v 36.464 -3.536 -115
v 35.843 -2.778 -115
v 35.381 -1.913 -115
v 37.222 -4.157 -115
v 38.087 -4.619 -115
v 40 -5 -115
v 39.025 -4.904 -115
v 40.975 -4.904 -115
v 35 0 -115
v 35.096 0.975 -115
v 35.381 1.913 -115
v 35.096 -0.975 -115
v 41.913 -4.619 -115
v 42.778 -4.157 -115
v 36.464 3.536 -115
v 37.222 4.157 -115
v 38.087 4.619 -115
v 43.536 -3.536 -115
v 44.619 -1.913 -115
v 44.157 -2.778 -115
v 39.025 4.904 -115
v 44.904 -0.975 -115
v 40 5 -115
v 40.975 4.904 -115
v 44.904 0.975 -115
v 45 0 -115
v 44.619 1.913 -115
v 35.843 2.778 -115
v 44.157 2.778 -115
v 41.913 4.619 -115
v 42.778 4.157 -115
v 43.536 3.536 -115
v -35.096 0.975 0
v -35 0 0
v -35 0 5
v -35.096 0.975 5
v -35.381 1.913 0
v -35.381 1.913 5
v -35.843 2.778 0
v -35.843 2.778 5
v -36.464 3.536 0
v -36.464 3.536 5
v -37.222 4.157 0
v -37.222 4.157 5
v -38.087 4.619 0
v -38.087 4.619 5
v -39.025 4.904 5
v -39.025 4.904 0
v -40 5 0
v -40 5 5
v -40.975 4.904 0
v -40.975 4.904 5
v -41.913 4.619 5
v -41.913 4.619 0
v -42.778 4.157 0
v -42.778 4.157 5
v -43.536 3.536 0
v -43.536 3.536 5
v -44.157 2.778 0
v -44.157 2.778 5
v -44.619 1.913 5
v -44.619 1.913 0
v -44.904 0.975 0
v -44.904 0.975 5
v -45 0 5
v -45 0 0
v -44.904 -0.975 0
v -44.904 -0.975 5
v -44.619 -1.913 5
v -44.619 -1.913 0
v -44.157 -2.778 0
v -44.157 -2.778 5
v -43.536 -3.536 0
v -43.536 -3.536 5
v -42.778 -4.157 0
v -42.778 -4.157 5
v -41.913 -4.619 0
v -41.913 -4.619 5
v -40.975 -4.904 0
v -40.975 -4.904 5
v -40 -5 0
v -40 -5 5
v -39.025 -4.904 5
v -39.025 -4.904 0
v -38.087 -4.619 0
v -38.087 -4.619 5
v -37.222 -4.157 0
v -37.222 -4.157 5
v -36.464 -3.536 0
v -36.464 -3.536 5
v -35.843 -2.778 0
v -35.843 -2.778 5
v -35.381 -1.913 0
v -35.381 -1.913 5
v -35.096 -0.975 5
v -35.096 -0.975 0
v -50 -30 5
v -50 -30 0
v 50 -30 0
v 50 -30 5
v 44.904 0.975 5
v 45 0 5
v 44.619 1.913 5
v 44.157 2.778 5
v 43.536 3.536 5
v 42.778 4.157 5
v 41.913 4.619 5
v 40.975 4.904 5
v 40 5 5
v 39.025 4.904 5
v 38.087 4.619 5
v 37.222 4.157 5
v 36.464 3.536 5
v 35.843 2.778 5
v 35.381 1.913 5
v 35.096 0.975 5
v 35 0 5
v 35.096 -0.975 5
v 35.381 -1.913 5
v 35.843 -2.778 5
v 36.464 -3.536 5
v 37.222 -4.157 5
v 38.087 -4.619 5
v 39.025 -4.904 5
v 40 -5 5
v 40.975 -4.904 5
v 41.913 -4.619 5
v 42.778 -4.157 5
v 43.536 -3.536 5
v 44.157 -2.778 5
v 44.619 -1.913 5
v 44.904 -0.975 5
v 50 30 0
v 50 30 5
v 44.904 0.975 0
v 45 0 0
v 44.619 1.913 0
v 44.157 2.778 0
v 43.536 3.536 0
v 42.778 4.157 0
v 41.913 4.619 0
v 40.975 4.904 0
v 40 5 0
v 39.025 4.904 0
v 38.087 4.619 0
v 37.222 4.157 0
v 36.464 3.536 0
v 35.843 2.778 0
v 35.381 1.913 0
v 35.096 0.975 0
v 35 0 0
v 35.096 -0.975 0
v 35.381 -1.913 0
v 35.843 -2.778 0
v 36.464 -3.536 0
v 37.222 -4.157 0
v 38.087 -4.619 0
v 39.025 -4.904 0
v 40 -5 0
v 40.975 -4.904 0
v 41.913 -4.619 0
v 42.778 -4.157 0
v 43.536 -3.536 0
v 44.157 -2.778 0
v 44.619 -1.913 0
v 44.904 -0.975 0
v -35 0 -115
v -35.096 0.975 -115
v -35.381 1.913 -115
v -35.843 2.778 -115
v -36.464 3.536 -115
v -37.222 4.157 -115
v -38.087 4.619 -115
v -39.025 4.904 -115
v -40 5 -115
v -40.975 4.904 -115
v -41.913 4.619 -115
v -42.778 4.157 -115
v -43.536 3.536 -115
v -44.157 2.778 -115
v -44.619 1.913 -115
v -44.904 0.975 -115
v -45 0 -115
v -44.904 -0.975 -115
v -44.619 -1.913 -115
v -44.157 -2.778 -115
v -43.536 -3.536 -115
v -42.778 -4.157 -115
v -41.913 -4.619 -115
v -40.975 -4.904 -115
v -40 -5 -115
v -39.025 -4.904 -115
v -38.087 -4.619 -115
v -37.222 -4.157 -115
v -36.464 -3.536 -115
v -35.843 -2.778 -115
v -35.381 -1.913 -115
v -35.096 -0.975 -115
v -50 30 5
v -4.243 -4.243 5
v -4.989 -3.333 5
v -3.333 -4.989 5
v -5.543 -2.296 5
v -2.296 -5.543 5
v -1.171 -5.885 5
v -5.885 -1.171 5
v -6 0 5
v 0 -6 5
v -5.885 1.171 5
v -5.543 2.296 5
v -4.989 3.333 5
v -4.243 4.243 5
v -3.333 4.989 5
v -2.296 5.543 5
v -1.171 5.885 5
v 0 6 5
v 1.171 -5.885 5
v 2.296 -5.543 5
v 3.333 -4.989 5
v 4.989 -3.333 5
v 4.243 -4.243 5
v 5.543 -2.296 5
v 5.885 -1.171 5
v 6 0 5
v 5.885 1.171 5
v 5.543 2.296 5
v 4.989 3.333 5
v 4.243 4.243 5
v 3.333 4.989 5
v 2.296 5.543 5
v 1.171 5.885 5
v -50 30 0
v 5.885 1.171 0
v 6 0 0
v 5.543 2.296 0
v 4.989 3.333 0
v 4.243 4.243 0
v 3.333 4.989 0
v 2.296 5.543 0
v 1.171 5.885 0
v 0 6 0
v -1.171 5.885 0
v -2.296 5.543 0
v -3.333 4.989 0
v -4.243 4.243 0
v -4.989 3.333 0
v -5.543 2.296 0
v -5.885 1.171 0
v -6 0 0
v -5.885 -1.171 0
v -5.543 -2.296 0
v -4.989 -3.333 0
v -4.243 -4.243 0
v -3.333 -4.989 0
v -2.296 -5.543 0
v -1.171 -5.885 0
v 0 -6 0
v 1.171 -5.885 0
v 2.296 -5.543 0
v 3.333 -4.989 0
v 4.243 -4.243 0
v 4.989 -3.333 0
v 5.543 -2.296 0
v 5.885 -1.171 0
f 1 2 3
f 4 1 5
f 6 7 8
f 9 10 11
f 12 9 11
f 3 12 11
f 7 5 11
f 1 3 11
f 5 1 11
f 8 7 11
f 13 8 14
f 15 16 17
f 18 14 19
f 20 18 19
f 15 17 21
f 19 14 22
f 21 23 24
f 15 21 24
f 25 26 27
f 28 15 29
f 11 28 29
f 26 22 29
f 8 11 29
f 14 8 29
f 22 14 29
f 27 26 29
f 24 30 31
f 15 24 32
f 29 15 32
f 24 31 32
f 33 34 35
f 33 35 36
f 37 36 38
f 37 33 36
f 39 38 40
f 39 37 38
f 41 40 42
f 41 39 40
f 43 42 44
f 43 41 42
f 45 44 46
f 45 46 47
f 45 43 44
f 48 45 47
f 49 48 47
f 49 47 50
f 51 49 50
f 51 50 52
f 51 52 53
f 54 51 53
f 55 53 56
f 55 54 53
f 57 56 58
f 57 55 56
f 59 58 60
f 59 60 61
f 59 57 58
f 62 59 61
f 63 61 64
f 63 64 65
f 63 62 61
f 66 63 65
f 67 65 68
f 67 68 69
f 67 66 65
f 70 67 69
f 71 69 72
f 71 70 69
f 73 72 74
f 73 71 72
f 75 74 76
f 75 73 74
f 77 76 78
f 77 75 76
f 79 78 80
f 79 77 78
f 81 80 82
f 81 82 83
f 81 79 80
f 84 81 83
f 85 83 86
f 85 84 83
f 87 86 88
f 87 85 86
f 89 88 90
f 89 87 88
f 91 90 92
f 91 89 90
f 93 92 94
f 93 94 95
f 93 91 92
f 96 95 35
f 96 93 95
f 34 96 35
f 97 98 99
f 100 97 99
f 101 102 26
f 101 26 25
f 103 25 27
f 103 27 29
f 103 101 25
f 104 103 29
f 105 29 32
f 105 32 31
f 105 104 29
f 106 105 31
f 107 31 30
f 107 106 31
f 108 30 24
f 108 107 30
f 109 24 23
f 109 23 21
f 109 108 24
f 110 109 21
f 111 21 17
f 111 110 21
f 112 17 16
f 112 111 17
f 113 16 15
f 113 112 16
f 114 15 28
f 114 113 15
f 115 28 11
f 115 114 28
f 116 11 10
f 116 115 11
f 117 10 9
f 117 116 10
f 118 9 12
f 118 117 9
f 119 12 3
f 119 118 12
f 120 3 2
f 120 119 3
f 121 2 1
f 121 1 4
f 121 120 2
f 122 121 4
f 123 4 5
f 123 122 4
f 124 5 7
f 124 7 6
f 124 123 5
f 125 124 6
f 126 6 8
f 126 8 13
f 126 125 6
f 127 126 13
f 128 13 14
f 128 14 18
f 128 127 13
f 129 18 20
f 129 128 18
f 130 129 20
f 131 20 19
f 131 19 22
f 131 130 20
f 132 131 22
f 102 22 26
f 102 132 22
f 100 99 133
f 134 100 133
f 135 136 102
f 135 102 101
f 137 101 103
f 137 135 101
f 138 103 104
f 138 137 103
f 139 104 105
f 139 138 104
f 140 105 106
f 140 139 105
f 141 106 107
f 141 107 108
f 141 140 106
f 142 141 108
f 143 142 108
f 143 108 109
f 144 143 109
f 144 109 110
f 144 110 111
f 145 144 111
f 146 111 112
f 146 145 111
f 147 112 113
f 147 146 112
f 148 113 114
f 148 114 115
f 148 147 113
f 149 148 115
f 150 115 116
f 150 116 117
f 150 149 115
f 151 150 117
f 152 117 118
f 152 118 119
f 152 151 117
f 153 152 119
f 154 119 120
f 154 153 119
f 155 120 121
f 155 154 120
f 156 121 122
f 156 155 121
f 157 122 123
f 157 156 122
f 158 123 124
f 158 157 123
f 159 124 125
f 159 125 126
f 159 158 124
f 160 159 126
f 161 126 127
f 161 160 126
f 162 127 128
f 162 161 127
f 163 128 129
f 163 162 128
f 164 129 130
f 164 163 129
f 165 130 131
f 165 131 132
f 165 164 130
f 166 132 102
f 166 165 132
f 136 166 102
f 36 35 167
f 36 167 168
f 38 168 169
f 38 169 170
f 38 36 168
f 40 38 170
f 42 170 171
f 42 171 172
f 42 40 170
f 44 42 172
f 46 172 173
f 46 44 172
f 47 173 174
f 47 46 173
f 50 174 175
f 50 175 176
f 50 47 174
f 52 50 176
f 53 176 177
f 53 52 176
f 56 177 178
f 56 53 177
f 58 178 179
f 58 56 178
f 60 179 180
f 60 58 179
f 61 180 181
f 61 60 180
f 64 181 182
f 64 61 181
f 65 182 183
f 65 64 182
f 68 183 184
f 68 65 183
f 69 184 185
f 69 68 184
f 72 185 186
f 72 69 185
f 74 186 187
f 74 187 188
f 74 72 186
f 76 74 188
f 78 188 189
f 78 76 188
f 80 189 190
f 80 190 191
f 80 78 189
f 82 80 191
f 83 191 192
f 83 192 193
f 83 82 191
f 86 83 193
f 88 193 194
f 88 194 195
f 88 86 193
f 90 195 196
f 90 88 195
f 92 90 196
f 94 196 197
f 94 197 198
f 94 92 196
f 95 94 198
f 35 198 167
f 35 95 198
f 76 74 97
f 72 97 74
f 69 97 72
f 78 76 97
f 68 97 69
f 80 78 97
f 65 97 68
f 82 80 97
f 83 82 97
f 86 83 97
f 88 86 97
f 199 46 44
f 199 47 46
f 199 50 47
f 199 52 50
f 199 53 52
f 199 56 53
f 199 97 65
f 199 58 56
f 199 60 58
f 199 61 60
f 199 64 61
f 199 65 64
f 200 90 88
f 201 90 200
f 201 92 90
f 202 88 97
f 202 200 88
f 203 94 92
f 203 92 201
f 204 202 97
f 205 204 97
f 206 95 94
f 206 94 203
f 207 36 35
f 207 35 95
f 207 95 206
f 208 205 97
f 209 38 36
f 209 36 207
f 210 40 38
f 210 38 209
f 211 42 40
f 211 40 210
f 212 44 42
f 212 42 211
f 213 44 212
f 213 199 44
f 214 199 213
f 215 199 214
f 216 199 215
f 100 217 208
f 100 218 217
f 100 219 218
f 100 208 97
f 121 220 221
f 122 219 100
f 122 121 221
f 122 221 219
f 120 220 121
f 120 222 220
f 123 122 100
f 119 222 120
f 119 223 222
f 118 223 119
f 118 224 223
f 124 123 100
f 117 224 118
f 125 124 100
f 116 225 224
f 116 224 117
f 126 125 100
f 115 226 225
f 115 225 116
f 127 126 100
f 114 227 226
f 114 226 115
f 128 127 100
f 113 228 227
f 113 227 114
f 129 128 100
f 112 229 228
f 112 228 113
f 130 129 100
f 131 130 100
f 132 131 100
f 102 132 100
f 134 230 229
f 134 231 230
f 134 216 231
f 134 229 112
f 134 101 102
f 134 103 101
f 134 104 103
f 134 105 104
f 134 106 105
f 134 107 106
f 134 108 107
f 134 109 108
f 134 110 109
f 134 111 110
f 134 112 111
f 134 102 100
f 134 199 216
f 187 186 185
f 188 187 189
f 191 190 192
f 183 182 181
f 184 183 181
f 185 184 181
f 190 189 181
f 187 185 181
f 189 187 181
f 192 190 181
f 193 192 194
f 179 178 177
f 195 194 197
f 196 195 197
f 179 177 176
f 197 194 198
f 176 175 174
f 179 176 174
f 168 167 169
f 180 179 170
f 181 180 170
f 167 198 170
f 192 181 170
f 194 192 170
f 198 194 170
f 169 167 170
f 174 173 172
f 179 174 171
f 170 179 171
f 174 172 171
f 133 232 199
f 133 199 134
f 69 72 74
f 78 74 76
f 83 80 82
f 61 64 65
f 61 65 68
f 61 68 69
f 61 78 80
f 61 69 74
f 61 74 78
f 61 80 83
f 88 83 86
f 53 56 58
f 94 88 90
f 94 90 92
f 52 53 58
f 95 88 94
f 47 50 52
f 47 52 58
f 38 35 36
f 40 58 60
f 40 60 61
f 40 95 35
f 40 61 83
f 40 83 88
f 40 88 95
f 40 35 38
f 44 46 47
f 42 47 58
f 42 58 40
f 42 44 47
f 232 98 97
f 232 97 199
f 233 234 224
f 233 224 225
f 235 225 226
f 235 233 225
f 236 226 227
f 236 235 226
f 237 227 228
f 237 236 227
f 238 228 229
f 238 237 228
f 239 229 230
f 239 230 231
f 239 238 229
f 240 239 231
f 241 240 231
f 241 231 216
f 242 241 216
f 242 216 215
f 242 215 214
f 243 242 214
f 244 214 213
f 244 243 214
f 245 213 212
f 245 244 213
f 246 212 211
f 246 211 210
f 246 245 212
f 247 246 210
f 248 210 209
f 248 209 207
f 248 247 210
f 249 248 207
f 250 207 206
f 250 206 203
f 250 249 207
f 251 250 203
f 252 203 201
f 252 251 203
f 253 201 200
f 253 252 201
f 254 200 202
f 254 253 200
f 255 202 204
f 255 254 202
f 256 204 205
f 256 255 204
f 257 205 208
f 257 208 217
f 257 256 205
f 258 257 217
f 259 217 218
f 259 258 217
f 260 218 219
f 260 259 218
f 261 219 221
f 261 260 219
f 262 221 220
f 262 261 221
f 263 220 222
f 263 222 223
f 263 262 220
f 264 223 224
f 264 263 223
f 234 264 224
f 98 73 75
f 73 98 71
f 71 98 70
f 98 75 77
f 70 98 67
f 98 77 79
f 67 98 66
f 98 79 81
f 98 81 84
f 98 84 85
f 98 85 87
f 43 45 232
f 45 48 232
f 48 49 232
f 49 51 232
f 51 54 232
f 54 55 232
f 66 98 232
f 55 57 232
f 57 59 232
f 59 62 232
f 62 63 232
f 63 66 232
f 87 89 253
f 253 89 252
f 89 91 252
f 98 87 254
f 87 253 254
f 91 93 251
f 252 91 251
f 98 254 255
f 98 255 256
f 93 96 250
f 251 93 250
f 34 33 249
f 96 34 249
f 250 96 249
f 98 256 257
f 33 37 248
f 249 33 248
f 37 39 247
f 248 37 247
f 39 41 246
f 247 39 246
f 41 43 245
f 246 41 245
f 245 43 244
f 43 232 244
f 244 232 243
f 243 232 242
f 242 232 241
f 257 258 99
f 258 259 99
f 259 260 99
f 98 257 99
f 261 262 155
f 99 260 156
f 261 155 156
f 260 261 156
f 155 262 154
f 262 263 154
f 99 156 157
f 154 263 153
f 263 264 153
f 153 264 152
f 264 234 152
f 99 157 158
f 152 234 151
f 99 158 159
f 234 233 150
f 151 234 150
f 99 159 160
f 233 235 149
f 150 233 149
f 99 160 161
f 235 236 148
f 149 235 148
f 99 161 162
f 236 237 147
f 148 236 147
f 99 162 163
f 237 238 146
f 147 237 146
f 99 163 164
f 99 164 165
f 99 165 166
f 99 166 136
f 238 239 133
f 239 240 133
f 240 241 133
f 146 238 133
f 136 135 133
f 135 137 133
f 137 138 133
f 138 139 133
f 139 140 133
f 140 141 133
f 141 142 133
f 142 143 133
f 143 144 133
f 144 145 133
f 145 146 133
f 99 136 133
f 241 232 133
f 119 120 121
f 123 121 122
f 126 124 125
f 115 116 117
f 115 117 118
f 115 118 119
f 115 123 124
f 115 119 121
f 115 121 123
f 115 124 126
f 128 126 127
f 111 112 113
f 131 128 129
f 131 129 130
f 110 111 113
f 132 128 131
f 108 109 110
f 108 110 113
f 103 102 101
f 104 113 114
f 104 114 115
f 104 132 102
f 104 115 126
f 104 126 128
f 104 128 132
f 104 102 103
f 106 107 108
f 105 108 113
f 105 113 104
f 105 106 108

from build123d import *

# Parameters (mm, degrees)
SKETCH1_W             = 100
SKETCH1_H             = 60
SKETCH1_R             = 6
SKETCH1_R_2           = 5
BOSS_EXTRUDE1_DEPTH   = 5
SKETCH2_R             = 5
BOSS_EXTRUDE2_DEPTH   = 120
BOSS_EXTRUDE2_2_DEPTH = 120


with BuildPart() as part:
    # Sketch1 → Boss-Extrude1 (new body)
    with BuildSketch(Plane.XY):
        Rectangle(SKETCH1_W, SKETCH1_H)
        Circle(SKETCH1_R, mode=Mode.SUBTRACT)
        with Locations((-40, 0)):
            Circle(SKETCH1_R_2, mode=Mode.SUBTRACT)
        with Locations((40, 0)):
            Circle(SKETCH1_R_2, mode=Mode.SUBTRACT)
    extrude(amount=BOSS_EXTRUDE1_DEPTH)


with BuildPart() as body_2:
    # Sketch2 → Boss-Extrude2 (new body)
    with BuildSketch(Plane.XY.offset(5)):
        with Locations((40, 0)):
            Circle(SKETCH2_R)
    extrude(amount=-BOSS_EXTRUDE2_DEPTH)


with BuildPart() as body_3:
    # Sketch2 → Boss-Extrude2 2 (new body)
    with BuildSketch(Plane.XY.offset(5)):
        with Locations((-40, 0)):
            Circle(SKETCH2_R)
    extrude(amount=-BOSS_EXTRUDE2_2_DEPTH)


solid = Compound([part.part, body_2.part, body_3.part])
